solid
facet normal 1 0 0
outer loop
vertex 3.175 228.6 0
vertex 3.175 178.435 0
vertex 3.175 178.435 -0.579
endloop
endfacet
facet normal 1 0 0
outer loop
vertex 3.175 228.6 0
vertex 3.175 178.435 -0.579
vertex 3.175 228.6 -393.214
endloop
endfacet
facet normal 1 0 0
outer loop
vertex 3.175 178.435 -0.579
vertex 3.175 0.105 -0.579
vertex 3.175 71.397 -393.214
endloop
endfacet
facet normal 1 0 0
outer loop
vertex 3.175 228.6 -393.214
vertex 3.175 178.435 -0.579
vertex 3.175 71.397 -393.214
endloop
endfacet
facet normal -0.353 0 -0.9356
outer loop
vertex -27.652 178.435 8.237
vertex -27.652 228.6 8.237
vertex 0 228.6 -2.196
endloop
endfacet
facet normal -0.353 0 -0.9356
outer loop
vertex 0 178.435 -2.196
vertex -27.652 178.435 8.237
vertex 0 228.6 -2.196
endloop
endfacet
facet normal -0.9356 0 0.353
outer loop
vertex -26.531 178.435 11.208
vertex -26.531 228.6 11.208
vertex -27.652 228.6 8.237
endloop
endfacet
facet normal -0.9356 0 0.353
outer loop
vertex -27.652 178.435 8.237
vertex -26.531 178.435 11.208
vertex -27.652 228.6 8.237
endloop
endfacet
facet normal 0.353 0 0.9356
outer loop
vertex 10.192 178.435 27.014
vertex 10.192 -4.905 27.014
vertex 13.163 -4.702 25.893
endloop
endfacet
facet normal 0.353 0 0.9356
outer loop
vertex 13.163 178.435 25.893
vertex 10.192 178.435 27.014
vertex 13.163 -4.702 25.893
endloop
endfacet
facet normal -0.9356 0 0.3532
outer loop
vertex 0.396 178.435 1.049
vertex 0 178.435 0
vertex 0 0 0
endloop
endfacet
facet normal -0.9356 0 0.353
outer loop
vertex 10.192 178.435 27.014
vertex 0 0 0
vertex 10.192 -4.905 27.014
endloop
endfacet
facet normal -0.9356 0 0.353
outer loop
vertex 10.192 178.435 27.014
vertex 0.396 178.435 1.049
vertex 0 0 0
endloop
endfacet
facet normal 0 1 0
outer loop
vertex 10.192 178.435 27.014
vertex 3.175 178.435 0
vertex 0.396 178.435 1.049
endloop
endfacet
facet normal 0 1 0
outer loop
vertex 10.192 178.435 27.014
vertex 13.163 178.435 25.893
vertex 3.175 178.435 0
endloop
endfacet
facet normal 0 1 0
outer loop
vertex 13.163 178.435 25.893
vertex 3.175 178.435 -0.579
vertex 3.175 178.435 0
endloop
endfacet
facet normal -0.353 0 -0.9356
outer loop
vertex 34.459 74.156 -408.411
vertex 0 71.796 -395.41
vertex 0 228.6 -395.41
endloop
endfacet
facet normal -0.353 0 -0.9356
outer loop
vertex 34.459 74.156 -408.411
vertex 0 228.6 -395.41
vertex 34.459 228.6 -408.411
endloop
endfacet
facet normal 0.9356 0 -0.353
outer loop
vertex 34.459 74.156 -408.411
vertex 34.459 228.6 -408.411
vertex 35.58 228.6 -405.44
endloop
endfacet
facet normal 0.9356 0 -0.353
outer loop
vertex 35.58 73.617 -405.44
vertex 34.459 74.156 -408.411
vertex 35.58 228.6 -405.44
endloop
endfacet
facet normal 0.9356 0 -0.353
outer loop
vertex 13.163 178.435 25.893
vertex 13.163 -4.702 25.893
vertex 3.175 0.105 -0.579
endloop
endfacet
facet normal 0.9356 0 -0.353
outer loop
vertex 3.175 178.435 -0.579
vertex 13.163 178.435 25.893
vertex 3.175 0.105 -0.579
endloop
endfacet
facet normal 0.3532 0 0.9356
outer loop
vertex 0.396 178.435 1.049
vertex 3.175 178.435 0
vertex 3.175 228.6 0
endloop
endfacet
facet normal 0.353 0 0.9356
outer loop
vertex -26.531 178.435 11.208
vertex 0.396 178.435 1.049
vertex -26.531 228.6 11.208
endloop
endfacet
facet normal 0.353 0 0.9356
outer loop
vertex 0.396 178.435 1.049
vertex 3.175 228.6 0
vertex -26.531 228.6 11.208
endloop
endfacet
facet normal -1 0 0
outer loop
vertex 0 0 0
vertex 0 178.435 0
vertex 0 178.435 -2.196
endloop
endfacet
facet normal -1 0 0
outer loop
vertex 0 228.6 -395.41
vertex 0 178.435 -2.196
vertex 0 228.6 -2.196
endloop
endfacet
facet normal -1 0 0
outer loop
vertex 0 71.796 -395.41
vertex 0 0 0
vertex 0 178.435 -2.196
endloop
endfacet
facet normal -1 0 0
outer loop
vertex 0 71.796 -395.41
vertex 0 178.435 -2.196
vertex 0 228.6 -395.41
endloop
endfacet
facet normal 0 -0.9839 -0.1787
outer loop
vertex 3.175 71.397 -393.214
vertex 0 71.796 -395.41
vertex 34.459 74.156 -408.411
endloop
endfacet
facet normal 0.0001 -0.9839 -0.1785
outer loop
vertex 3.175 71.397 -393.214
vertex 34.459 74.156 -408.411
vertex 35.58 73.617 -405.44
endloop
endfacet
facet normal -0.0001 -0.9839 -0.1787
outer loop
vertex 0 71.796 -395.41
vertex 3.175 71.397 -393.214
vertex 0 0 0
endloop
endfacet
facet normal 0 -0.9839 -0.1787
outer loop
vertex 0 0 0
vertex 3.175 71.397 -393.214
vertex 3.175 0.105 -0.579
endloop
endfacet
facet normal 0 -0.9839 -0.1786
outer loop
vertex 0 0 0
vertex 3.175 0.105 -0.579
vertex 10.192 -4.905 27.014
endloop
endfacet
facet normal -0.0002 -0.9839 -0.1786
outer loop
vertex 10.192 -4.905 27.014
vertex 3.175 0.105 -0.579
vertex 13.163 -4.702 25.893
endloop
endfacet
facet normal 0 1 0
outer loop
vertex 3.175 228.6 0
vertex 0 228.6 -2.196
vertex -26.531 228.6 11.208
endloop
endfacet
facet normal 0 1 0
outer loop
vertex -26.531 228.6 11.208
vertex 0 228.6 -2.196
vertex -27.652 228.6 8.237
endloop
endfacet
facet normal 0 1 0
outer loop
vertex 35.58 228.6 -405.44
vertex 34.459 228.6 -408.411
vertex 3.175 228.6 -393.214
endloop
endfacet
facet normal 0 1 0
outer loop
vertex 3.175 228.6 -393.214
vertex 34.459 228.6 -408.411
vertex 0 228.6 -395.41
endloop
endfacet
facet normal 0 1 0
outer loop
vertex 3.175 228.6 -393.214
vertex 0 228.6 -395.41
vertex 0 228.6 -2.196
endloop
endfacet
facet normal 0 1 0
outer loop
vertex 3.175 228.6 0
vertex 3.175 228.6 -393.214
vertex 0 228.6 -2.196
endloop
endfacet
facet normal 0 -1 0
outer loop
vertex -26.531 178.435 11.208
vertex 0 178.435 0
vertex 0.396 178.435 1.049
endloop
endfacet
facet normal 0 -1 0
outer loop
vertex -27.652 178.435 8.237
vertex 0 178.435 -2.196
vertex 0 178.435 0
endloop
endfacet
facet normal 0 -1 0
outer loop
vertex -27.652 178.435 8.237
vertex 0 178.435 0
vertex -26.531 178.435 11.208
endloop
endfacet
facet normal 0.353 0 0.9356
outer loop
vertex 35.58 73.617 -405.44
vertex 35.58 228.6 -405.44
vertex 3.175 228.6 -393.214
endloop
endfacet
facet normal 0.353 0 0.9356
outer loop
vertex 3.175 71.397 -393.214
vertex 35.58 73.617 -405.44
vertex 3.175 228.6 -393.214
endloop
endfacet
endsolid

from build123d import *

# Parameters (mm, degrees)
SKETCH1_W           = 3.175
SKETCH1_H           = 395.409928
BOSS_EXTRUDE1_DEPTH = 228.6
CUT_EXTRUDE1_DEPTH  = 457.746156838
BOSS_EXTRUDE4_REACH = 458.746
BOSS_EXTRUDE5_DEPTH = 50.165
BOSS_EXTRUDE8_REACH = 449.107


with BuildPart() as part:
    # Sketch1 → Boss-Extrude1 (new body)
    with BuildSketch(Plane(origin=(0, 0, 0), x_dir=(1, 0, 0), z_dir=(0, 1, 0))):
        with Locations((1.5875, 197.704964)):
            Rectangle(SKETCH1_W, SKETCH1_H)
    extrude(amount=BOSS_EXTRUDE1_DEPTH)

    # Sketch2 → Cut-Extrude1 (cut, through all)
    with BuildSketch(Plane(origin=(3.175, 0, 0), x_dir=(0, 0, -1), z_dir=(1, 0, 0))):
        Polygon((0, 0), (395.409928, 71.795894), (395.409928, 0), align=None)
    extrude(amount=-CUT_EXTRUDE1_DEPTH, mode=Mode.SUBTRACT)

    # Boss-Extrude4: up to this plane
    boss_extrude4_end = Plane(origin=(0, 0, 0), z_dir=(0, 0.9839122845611679, 0.17865222161961358))
    # Sketch8 → Boss-Extrude4 (add, up to the surface)
    with BuildSketch(Plane(origin=(0, 228.6, 0), x_dir=(1, 0, 0), z_dir=(0, 1, 0)), mode=Mode.PRIVATE) as boss_extrude4_sk1:
        Polygon((0, 395.409928), (34.459069357, 408.410752554), (35.579830094, 405.440143126), (0, 392.016474486), align=None)
    boss_extrude4_tool1 = split(extrude(boss_extrude4_sk1.sketch, amount=-BOSS_EXTRUDE4_REACH, mode=Mode.PRIVATE), bisect_by=boss_extrude4_end, keep=Keep.BOTH, mode=Mode.PRIVATE)
    add(boss_extrude4_tool1.solids().sort_by_distance((17.511219, 228.6, -400.310838))[0])

    # Sketch9 → Boss-Extrude5 (add)
    with BuildSketch(Plane(origin=(0, 228.6, 0), x_dir=(1, 0, 0), z_dir=(0, 1, 0))):
        Polygon((3.175, 0), (-26.531094273, -11.207607374), (-27.65185501, -8.236997947), (3.175, 3.393453514), align=None)
    extrude(amount=-BOSS_EXTRUDE5_DEPTH)

    # Boss-Extrude8: up to this plane
    boss_extrude8_end = Plane(origin=(0, 0, 0), z_dir=(0, 0.9839122845611679, 0.17865222161961358))
    # Sketch13 → Boss-Extrude8 (add, up to the surface)
    with BuildSketch(Plane.XZ.offset(-178.435), mode=Mode.PRIVATE) as boss_extrude8_sk1:
        Polygon((0, 0), (10.19197679, 27.014135421), (13.162586217, 25.893374684), (1.954978843, -3.812719589), align=None)
    boss_extrude8_tool1 = split(extrude(boss_extrude8_sk1.sketch, amount=BOSS_EXTRUDE8_REACH, mode=Mode.PRIVATE), bisect_by=boss_extrude8_end, keep=Keep.BOTH, mode=Mode.PRIVATE)
    add(boss_extrude8_tool1.solids().sort_by_distance((6.346866, 178.435, 12.254186))[0])


solid = part.part
